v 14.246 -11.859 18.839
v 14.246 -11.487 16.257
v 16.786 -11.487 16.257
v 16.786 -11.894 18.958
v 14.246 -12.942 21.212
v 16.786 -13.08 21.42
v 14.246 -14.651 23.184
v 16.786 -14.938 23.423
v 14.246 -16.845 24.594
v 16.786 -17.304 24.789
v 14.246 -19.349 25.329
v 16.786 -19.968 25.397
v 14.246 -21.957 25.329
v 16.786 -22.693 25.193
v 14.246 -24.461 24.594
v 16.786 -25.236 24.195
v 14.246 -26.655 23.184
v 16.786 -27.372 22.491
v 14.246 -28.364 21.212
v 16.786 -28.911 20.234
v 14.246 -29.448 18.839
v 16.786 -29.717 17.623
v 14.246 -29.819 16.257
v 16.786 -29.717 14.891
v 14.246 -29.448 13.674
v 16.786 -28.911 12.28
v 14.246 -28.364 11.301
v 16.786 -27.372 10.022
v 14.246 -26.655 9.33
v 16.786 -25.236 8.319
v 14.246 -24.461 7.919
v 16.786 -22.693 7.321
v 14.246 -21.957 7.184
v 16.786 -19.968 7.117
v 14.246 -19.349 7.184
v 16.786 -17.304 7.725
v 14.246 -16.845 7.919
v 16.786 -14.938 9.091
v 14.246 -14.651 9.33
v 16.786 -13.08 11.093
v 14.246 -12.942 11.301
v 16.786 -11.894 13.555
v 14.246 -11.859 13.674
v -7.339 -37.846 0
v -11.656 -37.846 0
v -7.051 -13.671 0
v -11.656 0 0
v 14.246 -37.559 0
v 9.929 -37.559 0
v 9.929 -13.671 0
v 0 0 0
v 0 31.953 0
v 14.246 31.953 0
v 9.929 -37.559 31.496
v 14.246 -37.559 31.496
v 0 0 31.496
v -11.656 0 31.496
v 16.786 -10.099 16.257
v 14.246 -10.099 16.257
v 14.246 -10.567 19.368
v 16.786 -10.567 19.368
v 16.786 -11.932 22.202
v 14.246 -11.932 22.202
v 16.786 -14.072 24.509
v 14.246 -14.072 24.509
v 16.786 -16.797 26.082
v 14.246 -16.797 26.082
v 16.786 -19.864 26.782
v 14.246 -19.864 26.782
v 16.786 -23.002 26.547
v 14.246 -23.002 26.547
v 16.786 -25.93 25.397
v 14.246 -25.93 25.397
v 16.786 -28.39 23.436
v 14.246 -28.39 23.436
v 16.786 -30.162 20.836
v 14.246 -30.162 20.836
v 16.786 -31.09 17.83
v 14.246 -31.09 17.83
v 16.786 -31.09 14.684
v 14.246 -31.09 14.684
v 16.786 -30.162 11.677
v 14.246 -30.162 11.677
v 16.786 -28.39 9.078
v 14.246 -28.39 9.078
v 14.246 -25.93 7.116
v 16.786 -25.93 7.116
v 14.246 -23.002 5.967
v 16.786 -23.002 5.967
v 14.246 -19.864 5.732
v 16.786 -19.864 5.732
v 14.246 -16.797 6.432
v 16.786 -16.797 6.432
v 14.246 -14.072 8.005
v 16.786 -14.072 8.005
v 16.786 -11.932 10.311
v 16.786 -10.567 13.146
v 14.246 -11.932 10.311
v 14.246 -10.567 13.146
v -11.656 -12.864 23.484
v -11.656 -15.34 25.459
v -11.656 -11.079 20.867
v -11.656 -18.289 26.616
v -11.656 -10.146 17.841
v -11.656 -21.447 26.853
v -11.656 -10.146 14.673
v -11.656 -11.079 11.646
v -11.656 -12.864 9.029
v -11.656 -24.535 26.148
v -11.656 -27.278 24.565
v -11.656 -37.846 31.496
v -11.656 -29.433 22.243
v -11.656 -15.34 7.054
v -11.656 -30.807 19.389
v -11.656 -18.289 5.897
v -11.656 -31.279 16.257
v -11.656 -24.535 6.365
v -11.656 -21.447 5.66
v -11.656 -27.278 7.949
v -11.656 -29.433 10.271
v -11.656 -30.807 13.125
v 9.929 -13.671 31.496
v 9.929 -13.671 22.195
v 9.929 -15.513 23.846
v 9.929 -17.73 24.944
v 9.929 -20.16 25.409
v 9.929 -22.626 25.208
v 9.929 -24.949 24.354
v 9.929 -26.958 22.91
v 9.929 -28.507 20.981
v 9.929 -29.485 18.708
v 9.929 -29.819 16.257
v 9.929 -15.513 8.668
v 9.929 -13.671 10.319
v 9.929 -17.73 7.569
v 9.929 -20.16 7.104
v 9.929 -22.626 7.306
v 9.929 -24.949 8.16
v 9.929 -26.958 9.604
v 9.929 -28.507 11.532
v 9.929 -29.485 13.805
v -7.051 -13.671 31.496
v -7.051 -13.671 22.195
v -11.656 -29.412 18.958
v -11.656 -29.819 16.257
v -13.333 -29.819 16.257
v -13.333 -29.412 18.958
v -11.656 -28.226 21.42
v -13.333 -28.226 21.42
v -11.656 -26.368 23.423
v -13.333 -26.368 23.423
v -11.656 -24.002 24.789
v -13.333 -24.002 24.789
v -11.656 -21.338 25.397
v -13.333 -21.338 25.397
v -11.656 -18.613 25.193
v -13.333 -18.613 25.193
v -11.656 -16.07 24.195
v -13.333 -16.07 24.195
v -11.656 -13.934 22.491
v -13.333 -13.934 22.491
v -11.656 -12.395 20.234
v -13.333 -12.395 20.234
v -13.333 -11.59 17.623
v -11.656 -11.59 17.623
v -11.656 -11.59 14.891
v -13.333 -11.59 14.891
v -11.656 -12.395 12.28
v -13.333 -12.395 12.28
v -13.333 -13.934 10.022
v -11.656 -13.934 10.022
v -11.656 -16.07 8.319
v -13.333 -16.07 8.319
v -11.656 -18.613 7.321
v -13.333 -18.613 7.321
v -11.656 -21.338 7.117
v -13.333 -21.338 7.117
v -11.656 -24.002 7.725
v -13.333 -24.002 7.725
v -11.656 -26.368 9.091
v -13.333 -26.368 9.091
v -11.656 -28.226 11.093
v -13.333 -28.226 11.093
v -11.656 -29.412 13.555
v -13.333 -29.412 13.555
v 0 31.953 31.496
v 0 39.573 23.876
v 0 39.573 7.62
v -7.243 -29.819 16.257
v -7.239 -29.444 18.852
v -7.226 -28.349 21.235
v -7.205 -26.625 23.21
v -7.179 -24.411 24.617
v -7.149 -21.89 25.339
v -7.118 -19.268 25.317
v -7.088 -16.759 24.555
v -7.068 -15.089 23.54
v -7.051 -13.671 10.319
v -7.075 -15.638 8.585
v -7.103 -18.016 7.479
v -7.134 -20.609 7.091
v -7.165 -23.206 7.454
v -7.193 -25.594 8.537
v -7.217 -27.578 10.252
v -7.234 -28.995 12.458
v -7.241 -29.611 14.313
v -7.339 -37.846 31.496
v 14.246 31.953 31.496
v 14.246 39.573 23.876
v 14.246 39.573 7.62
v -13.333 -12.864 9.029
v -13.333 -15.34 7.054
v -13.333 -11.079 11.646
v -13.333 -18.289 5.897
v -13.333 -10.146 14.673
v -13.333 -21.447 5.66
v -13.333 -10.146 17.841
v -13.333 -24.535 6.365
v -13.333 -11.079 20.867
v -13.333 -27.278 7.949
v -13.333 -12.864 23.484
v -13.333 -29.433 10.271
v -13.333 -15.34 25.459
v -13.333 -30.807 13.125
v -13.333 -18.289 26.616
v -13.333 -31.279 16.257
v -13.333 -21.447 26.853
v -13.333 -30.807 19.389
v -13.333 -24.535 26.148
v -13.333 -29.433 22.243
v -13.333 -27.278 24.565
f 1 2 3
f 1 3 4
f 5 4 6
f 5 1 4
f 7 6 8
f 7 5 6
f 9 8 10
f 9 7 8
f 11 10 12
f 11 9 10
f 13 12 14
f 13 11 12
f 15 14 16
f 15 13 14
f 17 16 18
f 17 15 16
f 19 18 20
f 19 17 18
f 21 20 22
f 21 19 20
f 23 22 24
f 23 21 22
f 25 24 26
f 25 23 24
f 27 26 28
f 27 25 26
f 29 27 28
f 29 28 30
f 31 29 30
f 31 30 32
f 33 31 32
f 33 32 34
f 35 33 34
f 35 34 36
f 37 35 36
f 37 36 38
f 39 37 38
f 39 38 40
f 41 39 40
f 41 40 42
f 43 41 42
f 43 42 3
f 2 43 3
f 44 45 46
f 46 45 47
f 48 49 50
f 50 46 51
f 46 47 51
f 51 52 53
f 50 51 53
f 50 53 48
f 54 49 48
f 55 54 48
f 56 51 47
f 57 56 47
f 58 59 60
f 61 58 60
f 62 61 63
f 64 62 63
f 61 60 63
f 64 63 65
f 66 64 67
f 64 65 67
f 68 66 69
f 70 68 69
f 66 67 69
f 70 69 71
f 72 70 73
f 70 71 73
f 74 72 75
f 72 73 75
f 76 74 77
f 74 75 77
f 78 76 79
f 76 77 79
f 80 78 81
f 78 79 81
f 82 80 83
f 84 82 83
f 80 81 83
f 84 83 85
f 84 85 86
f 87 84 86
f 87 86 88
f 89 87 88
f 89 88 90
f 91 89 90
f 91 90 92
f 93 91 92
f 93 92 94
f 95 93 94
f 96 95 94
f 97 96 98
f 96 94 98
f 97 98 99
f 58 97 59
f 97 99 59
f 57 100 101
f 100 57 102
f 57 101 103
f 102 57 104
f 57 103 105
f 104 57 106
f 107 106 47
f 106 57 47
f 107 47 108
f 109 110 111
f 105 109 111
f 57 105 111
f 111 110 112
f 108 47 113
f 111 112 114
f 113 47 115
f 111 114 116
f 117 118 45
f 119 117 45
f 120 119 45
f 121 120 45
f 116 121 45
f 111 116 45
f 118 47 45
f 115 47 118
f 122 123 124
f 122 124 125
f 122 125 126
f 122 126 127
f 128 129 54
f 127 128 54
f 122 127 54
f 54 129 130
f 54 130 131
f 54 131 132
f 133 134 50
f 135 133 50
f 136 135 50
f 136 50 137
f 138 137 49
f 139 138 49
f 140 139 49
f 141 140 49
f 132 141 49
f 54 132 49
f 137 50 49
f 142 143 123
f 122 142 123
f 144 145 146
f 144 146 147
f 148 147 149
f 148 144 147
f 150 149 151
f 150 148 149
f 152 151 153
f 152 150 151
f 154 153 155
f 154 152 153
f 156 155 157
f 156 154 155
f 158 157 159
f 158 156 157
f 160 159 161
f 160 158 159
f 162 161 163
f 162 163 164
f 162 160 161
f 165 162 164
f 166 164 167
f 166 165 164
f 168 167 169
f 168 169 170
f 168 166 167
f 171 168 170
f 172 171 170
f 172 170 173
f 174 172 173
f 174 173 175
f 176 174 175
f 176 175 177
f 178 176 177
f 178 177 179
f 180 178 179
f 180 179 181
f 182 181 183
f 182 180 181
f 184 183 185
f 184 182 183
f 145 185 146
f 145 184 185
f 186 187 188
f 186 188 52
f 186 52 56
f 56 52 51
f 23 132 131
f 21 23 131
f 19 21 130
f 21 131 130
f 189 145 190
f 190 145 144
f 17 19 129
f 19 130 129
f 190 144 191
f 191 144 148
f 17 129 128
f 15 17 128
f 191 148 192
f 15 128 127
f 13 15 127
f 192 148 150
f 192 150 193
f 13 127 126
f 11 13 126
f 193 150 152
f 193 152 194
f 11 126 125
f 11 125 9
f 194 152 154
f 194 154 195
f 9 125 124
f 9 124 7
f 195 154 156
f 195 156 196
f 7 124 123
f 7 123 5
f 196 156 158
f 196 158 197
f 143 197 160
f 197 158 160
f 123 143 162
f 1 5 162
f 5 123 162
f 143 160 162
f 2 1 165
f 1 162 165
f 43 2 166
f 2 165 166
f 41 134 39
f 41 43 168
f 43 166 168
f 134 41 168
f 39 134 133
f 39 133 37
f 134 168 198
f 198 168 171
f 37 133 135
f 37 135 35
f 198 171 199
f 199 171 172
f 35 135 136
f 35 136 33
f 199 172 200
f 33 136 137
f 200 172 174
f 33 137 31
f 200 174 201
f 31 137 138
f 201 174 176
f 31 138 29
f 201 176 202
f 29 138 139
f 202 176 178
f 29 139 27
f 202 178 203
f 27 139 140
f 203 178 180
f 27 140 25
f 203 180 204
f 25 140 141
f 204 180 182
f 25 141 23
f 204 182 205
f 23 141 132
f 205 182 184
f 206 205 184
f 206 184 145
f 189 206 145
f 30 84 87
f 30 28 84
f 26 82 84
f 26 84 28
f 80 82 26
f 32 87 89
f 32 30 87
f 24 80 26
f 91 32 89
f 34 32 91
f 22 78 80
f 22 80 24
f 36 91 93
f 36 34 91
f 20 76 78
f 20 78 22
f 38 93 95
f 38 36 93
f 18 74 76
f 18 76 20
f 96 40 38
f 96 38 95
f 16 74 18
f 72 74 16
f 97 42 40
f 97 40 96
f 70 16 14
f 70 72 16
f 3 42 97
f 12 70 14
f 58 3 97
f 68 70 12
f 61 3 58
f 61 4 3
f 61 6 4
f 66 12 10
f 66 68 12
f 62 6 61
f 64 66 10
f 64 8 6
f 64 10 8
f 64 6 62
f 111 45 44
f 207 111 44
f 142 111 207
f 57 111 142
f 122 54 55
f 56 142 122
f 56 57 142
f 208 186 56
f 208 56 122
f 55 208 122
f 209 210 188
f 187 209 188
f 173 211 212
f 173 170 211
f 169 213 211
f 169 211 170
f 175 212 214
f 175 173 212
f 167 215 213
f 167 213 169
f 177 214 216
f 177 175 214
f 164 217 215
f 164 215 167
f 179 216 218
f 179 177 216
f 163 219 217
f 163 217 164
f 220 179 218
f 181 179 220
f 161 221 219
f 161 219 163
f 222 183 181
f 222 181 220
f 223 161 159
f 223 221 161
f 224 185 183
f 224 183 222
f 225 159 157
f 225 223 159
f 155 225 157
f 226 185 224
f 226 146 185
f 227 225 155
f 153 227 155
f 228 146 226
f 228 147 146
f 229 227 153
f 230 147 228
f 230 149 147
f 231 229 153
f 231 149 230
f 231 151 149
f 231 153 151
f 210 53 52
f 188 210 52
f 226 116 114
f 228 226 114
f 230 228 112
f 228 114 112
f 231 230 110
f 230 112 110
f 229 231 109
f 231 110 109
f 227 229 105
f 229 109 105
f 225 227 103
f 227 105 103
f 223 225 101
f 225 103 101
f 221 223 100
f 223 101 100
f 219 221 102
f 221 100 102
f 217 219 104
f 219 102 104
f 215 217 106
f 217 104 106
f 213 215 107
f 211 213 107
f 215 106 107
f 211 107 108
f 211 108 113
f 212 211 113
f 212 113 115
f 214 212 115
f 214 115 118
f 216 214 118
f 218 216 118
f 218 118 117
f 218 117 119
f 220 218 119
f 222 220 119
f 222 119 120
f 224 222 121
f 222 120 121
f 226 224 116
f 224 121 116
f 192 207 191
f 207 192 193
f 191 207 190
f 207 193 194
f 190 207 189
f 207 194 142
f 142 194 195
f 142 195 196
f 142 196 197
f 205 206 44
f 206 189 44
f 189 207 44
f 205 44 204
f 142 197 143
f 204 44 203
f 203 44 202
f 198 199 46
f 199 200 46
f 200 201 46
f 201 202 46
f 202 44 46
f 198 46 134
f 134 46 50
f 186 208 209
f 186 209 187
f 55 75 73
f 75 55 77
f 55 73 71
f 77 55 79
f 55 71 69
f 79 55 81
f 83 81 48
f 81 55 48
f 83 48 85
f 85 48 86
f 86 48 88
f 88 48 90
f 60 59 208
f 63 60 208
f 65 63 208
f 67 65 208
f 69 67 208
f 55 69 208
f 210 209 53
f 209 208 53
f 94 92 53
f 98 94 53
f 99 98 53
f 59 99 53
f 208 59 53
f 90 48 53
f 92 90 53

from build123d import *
from build123d import SkipClean  # not in build123d's __all__

# Parameters (mm, degrees)
F1_DEPTH = 31.496
F3_SIZE  = 7.62
F2_R     = 9.165833061
F4_DEPTH = 25.9035180712
F2_R_2   = 10.6260607341
F5_DEPTH = 1.6764
F6_R     = 10.5545569786
F6_R_2   = 9.165833061
F7_DEPTH = 2.54


with BuildPart() as f1:
    # F0 (on Top) → F1 (new body)
    with BuildSketch(Plane.XY):
        Polygon((0, 39.5732931793), (0, 0), (-11.656133458, 0), (-11.656133458, -37.8464572132), (-7.3390468024, -37.8464572132), (-7.0512411185, -13.6707741767), (9.9292984232, -13.6707741767), (9.9292984232, -37.5586524606), (14.2463846132, -37.5586524606), (14.2463846132, 0), (14.2463846132, 39.5732931793), align=None)
    extrude(amount=F1_DEPTH)

    # F3
    f3_edges = [f1.edges().sort_by_distance(p)[0] for p in [
        (7.123192, 39.573293, 31.496),
        (7.123192, 39.573293, 0),
    ]]
    chamfer(f3_edges, length=F3_SIZE)

    # F2 (on face) → F4 (cut, through all)
    with BuildSketch(Plane(origin=(-11.656133458, 0, 0), x_dir=(0, -1, 0), z_dir=(-1, 0, 0))):
        with Locations((20.6530578434, 16.2567738444)):
            Circle(F2_R)
    extrude(amount=-F4_DEPTH, mode=Mode.SUBTRACT)

    # F2 (on face) → F5 (join)
    with BuildSketch(Plane(origin=(-11.656133458, 0, 0), x_dir=(0, -1, 0), z_dir=(-1, 0, 0))):
        with Locations((20.6530578434, 16.2567738444)):
            Circle(F2_R_2)
        with Locations((20.6530578434, 16.2567738444)):
            Circle(F2_R, mode=Mode.SUBTRACT)
    extrude(amount=F5_DEPTH)

    # F6 (on face) → F7 (join)
    with BuildSketch(Plane.YZ.offset(14.2463846132)):
        with Locations((-20.6530578434, 16.2567738444)):
            Circle(F6_R)
        with Locations((-20.6530578434, 16.2567738444)):
            Circle(F6_R_2, mode=Mode.SUBTRACT)
    with SkipClean():  # cleaning this boolean's faces spoils the solid; the shape is the same uncleaned
        extrude(amount=F7_DEPTH)


solid = f1.part
